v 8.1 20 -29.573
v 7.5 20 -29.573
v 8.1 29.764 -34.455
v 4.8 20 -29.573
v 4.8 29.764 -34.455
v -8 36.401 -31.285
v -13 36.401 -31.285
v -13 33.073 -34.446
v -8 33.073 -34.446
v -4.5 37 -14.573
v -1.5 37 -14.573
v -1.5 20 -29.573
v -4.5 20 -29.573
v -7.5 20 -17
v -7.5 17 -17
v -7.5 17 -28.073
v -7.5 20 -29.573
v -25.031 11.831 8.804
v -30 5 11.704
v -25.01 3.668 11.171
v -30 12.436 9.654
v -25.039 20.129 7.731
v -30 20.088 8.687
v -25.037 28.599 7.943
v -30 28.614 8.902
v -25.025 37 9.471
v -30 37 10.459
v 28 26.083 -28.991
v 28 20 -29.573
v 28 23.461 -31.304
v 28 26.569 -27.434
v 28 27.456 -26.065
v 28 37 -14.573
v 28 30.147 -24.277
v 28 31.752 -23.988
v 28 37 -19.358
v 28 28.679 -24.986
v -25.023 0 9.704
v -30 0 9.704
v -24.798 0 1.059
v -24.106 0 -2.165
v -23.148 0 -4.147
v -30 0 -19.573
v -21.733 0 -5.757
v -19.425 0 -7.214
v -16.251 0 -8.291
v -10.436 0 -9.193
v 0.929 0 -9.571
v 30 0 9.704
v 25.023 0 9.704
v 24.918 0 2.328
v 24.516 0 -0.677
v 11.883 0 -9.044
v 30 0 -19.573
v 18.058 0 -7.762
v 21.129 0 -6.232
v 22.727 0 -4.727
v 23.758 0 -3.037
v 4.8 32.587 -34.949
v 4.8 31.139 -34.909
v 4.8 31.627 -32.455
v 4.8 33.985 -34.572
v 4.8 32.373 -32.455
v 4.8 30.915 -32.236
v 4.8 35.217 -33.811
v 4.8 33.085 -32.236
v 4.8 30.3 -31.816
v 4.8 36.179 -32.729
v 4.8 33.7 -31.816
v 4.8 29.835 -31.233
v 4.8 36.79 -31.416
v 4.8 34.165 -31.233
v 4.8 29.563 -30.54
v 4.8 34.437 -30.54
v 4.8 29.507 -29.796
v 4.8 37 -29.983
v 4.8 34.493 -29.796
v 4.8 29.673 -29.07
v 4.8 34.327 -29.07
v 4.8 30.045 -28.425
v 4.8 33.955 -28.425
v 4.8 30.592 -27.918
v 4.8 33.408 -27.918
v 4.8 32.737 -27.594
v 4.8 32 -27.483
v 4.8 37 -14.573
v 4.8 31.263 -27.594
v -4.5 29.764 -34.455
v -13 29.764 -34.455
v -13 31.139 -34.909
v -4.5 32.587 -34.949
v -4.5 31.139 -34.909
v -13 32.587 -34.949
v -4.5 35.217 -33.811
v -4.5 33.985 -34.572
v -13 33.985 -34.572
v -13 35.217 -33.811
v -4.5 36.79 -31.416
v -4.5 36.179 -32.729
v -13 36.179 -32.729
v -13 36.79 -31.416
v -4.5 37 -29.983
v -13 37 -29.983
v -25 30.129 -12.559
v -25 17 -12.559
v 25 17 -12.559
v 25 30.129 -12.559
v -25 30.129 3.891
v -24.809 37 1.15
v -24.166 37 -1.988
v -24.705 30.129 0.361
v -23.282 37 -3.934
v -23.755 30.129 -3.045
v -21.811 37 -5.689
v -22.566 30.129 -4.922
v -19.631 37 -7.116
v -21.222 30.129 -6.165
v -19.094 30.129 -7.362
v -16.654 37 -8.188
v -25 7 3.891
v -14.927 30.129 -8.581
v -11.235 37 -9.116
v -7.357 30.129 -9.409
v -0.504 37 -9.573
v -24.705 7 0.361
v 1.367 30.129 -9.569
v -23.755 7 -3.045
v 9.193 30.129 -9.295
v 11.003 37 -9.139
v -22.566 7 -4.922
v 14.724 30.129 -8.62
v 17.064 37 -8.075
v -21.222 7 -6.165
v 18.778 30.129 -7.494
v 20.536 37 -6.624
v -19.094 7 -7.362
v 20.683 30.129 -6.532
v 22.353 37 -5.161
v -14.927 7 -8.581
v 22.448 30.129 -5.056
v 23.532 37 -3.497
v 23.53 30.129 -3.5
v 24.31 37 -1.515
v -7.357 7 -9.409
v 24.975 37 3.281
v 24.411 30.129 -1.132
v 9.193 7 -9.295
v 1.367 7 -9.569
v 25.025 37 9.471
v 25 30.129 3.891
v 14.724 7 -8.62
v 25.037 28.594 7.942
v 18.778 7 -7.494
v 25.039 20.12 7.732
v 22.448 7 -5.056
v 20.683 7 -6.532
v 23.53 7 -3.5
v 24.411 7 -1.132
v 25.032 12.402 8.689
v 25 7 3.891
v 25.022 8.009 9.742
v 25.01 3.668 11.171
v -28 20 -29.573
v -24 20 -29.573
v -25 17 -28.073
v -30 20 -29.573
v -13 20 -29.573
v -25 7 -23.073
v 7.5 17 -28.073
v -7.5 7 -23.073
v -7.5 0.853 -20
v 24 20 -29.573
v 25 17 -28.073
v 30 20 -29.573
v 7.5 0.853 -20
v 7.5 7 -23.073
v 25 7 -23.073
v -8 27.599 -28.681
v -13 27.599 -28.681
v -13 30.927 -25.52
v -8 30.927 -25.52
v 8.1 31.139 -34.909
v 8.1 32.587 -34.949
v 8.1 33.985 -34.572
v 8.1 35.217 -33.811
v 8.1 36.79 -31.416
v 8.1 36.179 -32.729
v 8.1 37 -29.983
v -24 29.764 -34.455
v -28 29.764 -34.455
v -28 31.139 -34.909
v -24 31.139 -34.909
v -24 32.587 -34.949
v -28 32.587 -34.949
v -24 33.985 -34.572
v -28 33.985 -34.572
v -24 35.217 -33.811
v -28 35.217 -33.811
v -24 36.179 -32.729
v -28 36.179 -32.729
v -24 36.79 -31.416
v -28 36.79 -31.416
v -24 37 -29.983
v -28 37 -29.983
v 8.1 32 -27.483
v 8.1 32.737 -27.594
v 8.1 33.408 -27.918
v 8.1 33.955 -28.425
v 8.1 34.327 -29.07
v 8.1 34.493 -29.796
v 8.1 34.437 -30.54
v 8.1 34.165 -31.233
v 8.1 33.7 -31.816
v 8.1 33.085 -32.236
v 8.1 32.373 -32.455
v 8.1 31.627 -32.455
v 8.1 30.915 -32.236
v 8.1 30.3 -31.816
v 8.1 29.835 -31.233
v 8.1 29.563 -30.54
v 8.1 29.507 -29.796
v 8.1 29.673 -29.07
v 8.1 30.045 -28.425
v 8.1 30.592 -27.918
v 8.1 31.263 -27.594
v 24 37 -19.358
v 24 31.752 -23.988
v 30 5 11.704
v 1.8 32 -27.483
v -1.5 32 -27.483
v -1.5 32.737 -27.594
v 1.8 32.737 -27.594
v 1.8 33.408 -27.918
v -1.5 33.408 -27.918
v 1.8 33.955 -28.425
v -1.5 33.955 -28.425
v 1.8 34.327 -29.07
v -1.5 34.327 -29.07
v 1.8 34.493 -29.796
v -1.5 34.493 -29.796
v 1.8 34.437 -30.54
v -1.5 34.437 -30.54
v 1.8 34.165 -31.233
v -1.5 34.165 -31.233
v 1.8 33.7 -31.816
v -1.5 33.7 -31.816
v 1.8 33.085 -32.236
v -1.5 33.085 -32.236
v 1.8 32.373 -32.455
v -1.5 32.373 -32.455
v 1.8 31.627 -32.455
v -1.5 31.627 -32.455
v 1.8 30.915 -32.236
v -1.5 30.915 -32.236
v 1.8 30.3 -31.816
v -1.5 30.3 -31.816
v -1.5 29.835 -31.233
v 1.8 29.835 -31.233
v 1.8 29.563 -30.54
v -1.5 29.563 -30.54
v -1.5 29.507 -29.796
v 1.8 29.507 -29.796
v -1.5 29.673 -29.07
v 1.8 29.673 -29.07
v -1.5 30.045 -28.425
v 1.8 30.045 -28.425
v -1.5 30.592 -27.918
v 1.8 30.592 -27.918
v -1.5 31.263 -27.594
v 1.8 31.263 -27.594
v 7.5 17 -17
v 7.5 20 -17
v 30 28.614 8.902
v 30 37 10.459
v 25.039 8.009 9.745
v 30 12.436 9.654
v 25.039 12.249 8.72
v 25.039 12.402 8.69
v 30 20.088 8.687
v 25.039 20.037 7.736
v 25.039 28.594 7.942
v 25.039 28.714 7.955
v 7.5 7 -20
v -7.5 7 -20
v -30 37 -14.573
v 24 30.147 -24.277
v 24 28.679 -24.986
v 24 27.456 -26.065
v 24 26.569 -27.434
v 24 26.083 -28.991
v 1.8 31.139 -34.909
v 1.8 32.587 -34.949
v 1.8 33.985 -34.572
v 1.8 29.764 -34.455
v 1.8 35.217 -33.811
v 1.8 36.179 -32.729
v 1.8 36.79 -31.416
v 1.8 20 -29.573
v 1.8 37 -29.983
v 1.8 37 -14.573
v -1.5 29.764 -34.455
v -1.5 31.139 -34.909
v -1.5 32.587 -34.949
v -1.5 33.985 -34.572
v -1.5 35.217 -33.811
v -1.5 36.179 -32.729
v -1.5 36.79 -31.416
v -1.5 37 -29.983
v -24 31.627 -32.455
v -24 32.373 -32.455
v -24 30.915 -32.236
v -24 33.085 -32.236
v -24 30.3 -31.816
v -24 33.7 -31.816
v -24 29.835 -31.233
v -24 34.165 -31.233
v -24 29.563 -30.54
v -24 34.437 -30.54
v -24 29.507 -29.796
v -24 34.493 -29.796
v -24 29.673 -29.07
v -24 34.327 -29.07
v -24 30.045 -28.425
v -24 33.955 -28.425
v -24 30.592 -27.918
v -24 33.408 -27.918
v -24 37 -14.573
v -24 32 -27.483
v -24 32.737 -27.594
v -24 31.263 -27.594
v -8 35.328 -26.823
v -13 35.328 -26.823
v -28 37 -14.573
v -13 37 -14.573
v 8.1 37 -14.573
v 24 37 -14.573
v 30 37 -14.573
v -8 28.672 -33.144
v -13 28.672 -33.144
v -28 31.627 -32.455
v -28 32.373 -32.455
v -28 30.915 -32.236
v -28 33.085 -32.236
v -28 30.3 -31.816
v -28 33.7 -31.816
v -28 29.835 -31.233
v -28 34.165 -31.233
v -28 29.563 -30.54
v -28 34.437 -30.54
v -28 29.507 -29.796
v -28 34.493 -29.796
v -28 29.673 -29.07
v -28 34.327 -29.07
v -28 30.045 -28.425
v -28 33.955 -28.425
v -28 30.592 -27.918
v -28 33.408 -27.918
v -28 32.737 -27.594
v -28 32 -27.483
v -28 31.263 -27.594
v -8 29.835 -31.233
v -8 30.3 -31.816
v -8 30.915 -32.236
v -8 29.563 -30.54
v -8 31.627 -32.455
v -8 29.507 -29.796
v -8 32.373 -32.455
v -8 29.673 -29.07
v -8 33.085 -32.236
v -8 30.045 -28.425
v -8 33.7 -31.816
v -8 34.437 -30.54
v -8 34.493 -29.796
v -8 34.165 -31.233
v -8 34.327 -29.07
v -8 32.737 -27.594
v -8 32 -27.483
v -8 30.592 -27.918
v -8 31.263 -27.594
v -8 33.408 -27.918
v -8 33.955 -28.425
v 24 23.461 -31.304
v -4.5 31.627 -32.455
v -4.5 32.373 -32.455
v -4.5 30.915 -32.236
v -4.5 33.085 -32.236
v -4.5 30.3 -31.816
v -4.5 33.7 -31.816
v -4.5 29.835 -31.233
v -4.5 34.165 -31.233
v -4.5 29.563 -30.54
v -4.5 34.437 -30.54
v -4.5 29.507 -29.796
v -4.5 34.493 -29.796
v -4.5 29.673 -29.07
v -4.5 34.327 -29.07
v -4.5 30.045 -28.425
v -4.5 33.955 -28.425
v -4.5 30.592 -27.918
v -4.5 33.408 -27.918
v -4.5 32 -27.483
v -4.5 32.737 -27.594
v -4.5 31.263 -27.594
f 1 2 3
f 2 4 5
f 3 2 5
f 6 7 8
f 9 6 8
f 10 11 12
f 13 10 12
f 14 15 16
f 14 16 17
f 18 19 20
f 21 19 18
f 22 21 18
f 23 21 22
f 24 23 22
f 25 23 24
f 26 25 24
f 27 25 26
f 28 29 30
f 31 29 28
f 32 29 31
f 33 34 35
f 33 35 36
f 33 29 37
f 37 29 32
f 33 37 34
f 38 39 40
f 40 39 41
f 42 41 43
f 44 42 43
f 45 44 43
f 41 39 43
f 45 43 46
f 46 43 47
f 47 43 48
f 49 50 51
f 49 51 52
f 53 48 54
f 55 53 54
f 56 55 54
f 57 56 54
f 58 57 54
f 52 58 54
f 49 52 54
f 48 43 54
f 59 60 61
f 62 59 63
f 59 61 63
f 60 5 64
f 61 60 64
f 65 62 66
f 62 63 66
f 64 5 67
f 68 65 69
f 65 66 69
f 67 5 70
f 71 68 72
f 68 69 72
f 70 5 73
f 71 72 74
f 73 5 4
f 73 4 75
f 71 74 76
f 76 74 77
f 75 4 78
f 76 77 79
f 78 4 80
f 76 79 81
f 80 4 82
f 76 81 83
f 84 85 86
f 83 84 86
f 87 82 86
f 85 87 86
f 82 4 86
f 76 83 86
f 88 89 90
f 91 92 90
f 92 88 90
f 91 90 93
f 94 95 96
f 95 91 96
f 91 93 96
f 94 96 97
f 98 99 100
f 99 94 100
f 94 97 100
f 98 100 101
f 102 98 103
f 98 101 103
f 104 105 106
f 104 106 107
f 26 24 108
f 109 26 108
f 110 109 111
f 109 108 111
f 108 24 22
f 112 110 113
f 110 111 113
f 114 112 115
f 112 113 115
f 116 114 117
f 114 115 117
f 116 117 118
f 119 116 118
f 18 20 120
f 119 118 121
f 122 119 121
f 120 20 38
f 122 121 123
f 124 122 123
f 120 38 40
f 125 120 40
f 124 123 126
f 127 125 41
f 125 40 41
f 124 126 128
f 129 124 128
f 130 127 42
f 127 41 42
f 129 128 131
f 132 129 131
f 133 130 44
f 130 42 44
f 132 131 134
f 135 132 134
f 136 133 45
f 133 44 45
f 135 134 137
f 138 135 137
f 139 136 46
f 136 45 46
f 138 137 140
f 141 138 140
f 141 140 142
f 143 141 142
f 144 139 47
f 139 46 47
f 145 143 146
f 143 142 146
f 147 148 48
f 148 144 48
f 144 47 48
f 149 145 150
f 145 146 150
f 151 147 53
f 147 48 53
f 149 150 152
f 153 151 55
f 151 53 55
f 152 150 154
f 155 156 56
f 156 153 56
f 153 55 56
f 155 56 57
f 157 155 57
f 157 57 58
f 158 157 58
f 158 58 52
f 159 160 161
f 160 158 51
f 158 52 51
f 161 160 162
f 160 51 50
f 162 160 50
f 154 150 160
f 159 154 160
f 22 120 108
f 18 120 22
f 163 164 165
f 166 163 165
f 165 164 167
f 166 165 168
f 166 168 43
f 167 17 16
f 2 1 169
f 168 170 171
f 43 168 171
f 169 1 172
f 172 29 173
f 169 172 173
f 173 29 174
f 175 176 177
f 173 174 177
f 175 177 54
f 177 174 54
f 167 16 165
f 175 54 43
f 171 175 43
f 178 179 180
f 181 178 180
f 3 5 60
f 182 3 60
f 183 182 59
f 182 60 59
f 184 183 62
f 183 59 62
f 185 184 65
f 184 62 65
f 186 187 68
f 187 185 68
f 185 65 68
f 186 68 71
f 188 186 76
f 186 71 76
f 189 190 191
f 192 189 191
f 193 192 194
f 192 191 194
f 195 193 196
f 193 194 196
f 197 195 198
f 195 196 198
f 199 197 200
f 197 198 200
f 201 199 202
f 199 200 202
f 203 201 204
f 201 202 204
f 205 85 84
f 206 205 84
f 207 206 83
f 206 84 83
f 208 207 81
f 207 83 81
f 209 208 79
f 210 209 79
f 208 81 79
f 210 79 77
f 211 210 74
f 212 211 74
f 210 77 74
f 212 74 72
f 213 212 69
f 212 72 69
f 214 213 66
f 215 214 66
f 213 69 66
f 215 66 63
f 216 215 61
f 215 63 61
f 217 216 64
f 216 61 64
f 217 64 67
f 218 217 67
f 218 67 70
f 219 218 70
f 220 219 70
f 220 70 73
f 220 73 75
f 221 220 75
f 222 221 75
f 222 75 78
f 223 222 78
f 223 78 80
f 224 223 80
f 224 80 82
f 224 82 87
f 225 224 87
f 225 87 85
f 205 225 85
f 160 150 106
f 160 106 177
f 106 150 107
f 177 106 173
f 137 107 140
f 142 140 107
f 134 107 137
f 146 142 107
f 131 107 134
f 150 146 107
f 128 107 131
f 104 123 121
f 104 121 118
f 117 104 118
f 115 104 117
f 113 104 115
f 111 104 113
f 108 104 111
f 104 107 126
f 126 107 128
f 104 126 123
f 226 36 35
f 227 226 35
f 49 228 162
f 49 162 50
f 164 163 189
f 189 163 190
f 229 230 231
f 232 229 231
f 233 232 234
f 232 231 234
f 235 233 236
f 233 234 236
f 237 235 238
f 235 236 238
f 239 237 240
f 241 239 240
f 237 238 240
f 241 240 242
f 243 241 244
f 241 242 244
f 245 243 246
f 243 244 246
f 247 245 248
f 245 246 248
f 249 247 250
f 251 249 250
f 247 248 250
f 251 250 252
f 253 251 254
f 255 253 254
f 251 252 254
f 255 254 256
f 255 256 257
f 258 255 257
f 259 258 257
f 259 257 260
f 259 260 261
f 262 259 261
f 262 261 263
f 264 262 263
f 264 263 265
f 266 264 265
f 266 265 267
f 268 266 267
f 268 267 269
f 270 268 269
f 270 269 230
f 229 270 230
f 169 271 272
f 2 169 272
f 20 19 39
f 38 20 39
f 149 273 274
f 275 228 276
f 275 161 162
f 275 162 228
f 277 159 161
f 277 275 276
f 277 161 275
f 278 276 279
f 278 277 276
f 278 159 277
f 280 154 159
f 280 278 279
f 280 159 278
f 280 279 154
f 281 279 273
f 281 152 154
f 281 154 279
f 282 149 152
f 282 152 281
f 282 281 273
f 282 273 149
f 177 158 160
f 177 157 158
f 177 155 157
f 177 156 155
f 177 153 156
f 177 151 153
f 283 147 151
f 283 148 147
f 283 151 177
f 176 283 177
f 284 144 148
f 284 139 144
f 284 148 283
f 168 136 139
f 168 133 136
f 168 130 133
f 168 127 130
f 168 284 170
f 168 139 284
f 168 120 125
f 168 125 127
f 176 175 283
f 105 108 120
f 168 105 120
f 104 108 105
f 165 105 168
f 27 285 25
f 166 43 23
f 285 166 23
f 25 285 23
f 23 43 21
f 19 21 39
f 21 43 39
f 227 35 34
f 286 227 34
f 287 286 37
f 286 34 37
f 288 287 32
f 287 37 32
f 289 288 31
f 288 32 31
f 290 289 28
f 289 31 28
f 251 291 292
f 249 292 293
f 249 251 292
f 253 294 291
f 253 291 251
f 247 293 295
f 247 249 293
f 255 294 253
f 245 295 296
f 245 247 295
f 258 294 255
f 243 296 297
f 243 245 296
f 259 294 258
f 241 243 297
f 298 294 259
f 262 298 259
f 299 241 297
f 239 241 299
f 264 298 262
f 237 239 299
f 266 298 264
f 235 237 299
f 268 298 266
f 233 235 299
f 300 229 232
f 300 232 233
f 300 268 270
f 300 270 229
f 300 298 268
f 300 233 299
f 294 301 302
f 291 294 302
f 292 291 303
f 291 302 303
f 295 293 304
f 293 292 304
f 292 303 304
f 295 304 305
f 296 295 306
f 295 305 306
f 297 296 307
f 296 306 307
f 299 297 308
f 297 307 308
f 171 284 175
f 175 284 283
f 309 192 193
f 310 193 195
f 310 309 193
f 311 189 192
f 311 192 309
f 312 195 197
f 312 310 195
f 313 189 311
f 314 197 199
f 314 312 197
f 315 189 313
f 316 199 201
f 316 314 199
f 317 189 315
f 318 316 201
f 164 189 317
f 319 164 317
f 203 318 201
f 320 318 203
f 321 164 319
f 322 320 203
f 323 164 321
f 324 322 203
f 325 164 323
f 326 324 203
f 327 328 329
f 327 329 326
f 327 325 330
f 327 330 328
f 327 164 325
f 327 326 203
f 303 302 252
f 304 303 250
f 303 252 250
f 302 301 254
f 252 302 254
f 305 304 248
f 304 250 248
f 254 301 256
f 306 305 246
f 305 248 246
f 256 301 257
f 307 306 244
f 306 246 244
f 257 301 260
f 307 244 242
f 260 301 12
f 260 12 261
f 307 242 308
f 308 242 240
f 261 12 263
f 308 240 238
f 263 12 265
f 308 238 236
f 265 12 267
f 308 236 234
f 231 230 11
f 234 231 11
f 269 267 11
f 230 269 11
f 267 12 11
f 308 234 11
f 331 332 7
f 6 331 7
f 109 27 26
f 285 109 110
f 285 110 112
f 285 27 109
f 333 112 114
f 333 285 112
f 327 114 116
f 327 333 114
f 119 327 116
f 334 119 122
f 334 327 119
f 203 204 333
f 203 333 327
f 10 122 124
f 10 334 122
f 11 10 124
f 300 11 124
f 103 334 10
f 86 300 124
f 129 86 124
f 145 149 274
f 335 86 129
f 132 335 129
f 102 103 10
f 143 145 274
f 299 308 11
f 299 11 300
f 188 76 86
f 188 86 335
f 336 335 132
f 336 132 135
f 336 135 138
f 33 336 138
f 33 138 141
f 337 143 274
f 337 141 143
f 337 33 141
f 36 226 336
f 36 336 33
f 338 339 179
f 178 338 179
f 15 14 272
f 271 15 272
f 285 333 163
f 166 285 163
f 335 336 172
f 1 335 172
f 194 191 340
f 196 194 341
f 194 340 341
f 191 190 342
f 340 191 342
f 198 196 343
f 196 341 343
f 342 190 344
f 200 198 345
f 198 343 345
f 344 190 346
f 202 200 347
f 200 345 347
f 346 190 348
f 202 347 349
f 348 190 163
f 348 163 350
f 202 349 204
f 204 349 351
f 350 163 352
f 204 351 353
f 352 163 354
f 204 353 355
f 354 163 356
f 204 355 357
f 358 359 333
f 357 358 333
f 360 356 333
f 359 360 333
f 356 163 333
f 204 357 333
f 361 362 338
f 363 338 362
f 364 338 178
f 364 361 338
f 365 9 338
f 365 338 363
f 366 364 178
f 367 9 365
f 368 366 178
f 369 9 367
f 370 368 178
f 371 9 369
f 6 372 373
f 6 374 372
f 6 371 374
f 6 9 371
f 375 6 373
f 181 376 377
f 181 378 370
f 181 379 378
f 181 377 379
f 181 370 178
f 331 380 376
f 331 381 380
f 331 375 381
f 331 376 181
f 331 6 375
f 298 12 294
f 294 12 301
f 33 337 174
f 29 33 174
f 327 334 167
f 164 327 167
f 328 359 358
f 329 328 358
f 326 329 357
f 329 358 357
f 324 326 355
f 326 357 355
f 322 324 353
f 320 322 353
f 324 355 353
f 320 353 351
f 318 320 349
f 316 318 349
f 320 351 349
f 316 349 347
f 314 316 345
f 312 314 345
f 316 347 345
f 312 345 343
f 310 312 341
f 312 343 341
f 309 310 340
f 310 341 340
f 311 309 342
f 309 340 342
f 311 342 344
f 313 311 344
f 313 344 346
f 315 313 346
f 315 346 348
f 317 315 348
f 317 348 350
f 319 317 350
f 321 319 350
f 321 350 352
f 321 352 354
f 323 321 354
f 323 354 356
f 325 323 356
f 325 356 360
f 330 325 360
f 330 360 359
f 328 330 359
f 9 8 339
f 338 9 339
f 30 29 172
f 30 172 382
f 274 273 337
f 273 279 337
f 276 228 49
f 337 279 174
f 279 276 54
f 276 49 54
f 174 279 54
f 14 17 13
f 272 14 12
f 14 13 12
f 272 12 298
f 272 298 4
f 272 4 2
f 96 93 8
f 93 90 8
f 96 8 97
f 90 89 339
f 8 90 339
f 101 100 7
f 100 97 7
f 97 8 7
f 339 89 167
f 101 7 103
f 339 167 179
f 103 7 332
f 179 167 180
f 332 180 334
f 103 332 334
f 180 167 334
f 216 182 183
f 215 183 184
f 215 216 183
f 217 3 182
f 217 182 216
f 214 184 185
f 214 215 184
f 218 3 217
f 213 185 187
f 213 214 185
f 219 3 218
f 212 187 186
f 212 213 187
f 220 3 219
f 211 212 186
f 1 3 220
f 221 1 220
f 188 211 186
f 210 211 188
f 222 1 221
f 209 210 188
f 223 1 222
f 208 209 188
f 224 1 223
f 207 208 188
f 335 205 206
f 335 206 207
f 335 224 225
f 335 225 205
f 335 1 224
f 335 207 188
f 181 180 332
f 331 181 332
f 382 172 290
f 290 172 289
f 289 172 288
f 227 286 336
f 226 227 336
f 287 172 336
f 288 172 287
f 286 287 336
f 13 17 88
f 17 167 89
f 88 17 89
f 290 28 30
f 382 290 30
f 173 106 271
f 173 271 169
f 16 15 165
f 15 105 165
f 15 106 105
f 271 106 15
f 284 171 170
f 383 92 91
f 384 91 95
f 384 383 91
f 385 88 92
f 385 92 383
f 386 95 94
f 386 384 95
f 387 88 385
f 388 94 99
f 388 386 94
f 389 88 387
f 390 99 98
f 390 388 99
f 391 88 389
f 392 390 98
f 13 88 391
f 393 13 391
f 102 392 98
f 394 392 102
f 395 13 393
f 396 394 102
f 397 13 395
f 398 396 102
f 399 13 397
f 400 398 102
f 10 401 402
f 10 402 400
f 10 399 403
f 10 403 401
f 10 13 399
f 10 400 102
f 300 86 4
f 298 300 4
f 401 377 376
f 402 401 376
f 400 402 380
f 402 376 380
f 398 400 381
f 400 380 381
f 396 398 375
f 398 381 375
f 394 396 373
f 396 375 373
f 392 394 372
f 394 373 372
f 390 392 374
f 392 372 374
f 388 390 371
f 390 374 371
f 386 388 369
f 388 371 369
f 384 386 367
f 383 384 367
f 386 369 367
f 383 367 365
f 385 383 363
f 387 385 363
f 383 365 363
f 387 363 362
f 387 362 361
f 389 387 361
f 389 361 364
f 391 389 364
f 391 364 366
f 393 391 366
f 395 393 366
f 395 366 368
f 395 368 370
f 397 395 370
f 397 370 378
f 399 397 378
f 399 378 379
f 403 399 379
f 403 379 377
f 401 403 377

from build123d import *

# Parameters (mm, degrees)
BOSS_EXTRUDE1_DEPTH     = 37
CUT_EXTRUDE1_DEPTH      = 1.0000001
CUT_EXTRUDE1_DEPTH_BACK = 61.0000001
SKETCH4_W               = 4
SKETCH4_H               = 22.671568097
SKETCH4_W_2             = 3.3
SKETCH4_W_3             = 8.5
BOSS_EXTRUDE2_DEPTH     = 22
SKETCH5_R               = 2.5
CUT_EXTRUDE3_DEPTH      = 61.0000001
CUT_EXTRUDE4_DEPTH      = 5
CUT_EXTRUDE5_START      = -5
CUT_EXTRUDE5_DEPTH      = 50
CUT_EXTRUDE6_DEPTH      = 5
CUT_EXTRUDE7_DEPTH      = 61.0000001
SKETCH13_W              = 15
SKETCH13_H              = 7
CUT_EXTRUDE8_DEPTH      = 8
SKETCH14_W              = 15
SKETCH14_H              = 3
CUT_EXTRUDE9_DEPTH      = 13


with BuildPart() as part:
    # Sketch1 → Boss-Extrude1 (new body)
    with BuildSketch(Plane(origin=(0, 0, 0), x_dir=(1, 0, 0), z_dir=(0, 1, 0))):
        with BuildLine():
            Line((-30, -13.426573427), (-25, -13.426573427))
            add(Edge.make_bspline(
                [(-25, -13.426573427), (-25, 4.430411277), (-27.179958799, 9.573426573), (0, 9.573426573)],
                knots=[0, 0, 0, 0, 1, 1, 1, 1], degree=3))
            add(Edge.make_bspline(
                [(25, -13.426573427), (25, 4.430411277), (27.179958799, 9.573426573), (0, 9.573426573)],
                knots=[0, 0, 0, 0, 1, 1, 1, 1], degree=3))
            Line((25, -13.426573427), (30, -13.426573427))
            Line((30, -13.426573427), (30, 29.573426573))
            Line((30, 29.573426573), (-30, 29.573426573))
            Line((-30, 29.573426573), (-30, -13.426573427))
        make_face()
    extrude(amount=BOSS_EXTRUDE1_DEPTH)

    # Sketch3 → Cut-Extrude1 (cut, two sides)
    with BuildSketch(Plane(origin=(30, 0, 0), x_dir=(0, 0, -1), z_dir=(1, 0, 0))) as cut_extrude1_sk:
        Polygon((-57.646837501, 118.849632618), (14.573426573, 37), (29.573426573, 20), (19.573426573, 0), (-29.242818474, -97.632490095), (187.21482124, -69.231683414), (158.810802213, 147.250439298), align=None)
    extrude(amount=CUT_EXTRUDE1_DEPTH, mode=Mode.SUBTRACT)
    extrude(cut_extrude1_sk.sketch, amount=-CUT_EXTRUDE1_DEPTH_BACK, mode=Mode.SUBTRACT)

    # Sketch4 → Boss-Extrude2 (add)
    with BuildSketch(Plane(origin=(0, 23.426505401, -26.550039455), x_dir=(-1, 0, 0), z_dir=(0, 0.661621637, -0.749837855))):
        with Locations((-26, 6.766122252)):
            Rectangle(SKETCH4_W, SKETCH4_H)
        with Locations((-6.45, 6.766122252)):
            Rectangle(SKETCH4_W_2, SKETCH4_H)
        with Locations((-0.15, 6.766122252)):
            Rectangle(SKETCH4_W_2, SKETCH4_H)
        with Locations((8.75, 6.766122252)):
            Rectangle(SKETCH4_W_3, SKETCH4_H)
        with Locations((26, 6.766122252)):
            Rectangle(SKETCH4_W, SKETCH4_H)
    extrude(amount=BOSS_EXTRUDE2_DEPTH)

    # Sketch5 → Cut-Extrude3 (cut, through all)
    with BuildSketch(Plane.ZY.offset(30)):
        with Locations((-29.98325663, 32)):
            Circle(SKETCH5_R)
        with BuildLine():
            Line((-29.573426573, 20), (-34.455392585, 29.763932023))
            ThreePointArc((-34.455392585, 29.763932023), (-34.236510671, 34.628655561), (-29.98325663, 37))
            Line((-29.98325663, 37), (-14.573426573, 37))
            Line((-14.573426573, 37), (-31.069859391, 51.555676016))
            Line((-31.069859391, 51.555676016), (-46.069859391, 34.555676016))
            Line((-46.069859391, 34.555676016), (-29.573426573, 20))
        make_face()
    extrude(amount=-CUT_EXTRUDE3_DEPTH, mode=Mode.SUBTRACT)

    # Sketch6 → Cut-Extrude4 (cut)
    with BuildSketch(Plane(origin=(28, 0, 0), x_dir=(0, 0, -1), z_dir=(1, 0, 0))):
        with BuildLine():
            Line((19.357697554, 37), (23.988388994, 31.751883035))
            ThreePointArc((23.988388994, 31.751883035), (25.484229497, 28.030270177), (28.990627874, 26.082678972))
            Line((28.990627874, 26.082678972), (31.303907567, 23.460961986))
            Line((31.303907567, 23.460961986), (39.342476381, 37))
            Line((39.342476381, 37), (19.357697554, 37))
        make_face()
    extrude(amount=-CUT_EXTRUDE4_DEPTH, mode=Mode.SUBTRACT)

    # Sketch8 → Cut-Extrude5 (cut)
    with BuildSketch(Plane.ZY.offset(30).offset(CUT_EXTRUDE5_START)):
        Polygon((-37.173999373, 17), (-24.143524451, 17), (-12.559294899, 17), (-12.559294899, 30.128793492), (16.915989795, 30.128793492), (24.04096029, 17), (24.04096029, 7), (-37.173999373, 7), align=None)
    extrude(amount=-CUT_EXTRUDE5_DEPTH, mode=Mode.SUBTRACT)

    # Sketch9 → Cut-Extrude6 (cut)
    with BuildSketch(Plane.ZY.offset(13)):
        Polygon((-28.681032795, 27.598669169), (-25.520480402, 30.927093507), (-26.822704237, 35.328424338), (-31.285480464, 36.401330831), (-34.446032857, 33.072906493), (-33.143809023, 28.671575662), align=None)
    extrude(amount=-CUT_EXTRUDE6_DEPTH, mode=Mode.SUBTRACT)

    # Sketch11 → Cut-Revolve1 (revolve, cut)
    with BuildSketch(Plane(origin=(0, 23, 0), x_dir=(1, 0, 0), z_dir=(0, 1, 0))):
        with BuildLine():
            Line((-50.031983596, -14.333391692), (49.362026098, -14.090860868))
            ThreePointArc((49.362026098, -14.090860868), (-0.356252807, -5.493589451), (-50.031983596, -14.333391692))
        make_face()
    revolve(axis=Axis((-30, 23, 62.493589451), (1, 0, 0)), mode=Mode.SUBTRACT)

    # Sketch12 → Cut-Extrude7 (cut, through all)
    with BuildSketch(Plane(origin=(30, 0, 0), x_dir=(0, 0, -1), z_dir=(1, 0, 0))):
        Polygon((-11.703889749, 5), (-9.703889749, 0), (-17.42565217, 0), align=None)
    extrude(amount=-CUT_EXTRUDE7_DEPTH, mode=Mode.SUBTRACT)

    # Sketch13 → Cut-Extrude8 (cut)
    with BuildSketch(Plane.XY.offset(-28)):
        with Locations((0, 3.5)):
            Rectangle(SKETCH13_W, SKETCH13_H)
    extrude(amount=CUT_EXTRUDE8_DEPTH, mode=Mode.SUBTRACT)

    # Sketch14 → Cut-Extrude9 (cut)
    with BuildSketch(Plane.XY.offset(-30)):
        with Locations((0, 18.5)):
            Rectangle(SKETCH14_W, SKETCH14_H)
    extrude(amount=CUT_EXTRUDE9_DEPTH, mode=Mode.SUBTRACT)


solid = part.part
